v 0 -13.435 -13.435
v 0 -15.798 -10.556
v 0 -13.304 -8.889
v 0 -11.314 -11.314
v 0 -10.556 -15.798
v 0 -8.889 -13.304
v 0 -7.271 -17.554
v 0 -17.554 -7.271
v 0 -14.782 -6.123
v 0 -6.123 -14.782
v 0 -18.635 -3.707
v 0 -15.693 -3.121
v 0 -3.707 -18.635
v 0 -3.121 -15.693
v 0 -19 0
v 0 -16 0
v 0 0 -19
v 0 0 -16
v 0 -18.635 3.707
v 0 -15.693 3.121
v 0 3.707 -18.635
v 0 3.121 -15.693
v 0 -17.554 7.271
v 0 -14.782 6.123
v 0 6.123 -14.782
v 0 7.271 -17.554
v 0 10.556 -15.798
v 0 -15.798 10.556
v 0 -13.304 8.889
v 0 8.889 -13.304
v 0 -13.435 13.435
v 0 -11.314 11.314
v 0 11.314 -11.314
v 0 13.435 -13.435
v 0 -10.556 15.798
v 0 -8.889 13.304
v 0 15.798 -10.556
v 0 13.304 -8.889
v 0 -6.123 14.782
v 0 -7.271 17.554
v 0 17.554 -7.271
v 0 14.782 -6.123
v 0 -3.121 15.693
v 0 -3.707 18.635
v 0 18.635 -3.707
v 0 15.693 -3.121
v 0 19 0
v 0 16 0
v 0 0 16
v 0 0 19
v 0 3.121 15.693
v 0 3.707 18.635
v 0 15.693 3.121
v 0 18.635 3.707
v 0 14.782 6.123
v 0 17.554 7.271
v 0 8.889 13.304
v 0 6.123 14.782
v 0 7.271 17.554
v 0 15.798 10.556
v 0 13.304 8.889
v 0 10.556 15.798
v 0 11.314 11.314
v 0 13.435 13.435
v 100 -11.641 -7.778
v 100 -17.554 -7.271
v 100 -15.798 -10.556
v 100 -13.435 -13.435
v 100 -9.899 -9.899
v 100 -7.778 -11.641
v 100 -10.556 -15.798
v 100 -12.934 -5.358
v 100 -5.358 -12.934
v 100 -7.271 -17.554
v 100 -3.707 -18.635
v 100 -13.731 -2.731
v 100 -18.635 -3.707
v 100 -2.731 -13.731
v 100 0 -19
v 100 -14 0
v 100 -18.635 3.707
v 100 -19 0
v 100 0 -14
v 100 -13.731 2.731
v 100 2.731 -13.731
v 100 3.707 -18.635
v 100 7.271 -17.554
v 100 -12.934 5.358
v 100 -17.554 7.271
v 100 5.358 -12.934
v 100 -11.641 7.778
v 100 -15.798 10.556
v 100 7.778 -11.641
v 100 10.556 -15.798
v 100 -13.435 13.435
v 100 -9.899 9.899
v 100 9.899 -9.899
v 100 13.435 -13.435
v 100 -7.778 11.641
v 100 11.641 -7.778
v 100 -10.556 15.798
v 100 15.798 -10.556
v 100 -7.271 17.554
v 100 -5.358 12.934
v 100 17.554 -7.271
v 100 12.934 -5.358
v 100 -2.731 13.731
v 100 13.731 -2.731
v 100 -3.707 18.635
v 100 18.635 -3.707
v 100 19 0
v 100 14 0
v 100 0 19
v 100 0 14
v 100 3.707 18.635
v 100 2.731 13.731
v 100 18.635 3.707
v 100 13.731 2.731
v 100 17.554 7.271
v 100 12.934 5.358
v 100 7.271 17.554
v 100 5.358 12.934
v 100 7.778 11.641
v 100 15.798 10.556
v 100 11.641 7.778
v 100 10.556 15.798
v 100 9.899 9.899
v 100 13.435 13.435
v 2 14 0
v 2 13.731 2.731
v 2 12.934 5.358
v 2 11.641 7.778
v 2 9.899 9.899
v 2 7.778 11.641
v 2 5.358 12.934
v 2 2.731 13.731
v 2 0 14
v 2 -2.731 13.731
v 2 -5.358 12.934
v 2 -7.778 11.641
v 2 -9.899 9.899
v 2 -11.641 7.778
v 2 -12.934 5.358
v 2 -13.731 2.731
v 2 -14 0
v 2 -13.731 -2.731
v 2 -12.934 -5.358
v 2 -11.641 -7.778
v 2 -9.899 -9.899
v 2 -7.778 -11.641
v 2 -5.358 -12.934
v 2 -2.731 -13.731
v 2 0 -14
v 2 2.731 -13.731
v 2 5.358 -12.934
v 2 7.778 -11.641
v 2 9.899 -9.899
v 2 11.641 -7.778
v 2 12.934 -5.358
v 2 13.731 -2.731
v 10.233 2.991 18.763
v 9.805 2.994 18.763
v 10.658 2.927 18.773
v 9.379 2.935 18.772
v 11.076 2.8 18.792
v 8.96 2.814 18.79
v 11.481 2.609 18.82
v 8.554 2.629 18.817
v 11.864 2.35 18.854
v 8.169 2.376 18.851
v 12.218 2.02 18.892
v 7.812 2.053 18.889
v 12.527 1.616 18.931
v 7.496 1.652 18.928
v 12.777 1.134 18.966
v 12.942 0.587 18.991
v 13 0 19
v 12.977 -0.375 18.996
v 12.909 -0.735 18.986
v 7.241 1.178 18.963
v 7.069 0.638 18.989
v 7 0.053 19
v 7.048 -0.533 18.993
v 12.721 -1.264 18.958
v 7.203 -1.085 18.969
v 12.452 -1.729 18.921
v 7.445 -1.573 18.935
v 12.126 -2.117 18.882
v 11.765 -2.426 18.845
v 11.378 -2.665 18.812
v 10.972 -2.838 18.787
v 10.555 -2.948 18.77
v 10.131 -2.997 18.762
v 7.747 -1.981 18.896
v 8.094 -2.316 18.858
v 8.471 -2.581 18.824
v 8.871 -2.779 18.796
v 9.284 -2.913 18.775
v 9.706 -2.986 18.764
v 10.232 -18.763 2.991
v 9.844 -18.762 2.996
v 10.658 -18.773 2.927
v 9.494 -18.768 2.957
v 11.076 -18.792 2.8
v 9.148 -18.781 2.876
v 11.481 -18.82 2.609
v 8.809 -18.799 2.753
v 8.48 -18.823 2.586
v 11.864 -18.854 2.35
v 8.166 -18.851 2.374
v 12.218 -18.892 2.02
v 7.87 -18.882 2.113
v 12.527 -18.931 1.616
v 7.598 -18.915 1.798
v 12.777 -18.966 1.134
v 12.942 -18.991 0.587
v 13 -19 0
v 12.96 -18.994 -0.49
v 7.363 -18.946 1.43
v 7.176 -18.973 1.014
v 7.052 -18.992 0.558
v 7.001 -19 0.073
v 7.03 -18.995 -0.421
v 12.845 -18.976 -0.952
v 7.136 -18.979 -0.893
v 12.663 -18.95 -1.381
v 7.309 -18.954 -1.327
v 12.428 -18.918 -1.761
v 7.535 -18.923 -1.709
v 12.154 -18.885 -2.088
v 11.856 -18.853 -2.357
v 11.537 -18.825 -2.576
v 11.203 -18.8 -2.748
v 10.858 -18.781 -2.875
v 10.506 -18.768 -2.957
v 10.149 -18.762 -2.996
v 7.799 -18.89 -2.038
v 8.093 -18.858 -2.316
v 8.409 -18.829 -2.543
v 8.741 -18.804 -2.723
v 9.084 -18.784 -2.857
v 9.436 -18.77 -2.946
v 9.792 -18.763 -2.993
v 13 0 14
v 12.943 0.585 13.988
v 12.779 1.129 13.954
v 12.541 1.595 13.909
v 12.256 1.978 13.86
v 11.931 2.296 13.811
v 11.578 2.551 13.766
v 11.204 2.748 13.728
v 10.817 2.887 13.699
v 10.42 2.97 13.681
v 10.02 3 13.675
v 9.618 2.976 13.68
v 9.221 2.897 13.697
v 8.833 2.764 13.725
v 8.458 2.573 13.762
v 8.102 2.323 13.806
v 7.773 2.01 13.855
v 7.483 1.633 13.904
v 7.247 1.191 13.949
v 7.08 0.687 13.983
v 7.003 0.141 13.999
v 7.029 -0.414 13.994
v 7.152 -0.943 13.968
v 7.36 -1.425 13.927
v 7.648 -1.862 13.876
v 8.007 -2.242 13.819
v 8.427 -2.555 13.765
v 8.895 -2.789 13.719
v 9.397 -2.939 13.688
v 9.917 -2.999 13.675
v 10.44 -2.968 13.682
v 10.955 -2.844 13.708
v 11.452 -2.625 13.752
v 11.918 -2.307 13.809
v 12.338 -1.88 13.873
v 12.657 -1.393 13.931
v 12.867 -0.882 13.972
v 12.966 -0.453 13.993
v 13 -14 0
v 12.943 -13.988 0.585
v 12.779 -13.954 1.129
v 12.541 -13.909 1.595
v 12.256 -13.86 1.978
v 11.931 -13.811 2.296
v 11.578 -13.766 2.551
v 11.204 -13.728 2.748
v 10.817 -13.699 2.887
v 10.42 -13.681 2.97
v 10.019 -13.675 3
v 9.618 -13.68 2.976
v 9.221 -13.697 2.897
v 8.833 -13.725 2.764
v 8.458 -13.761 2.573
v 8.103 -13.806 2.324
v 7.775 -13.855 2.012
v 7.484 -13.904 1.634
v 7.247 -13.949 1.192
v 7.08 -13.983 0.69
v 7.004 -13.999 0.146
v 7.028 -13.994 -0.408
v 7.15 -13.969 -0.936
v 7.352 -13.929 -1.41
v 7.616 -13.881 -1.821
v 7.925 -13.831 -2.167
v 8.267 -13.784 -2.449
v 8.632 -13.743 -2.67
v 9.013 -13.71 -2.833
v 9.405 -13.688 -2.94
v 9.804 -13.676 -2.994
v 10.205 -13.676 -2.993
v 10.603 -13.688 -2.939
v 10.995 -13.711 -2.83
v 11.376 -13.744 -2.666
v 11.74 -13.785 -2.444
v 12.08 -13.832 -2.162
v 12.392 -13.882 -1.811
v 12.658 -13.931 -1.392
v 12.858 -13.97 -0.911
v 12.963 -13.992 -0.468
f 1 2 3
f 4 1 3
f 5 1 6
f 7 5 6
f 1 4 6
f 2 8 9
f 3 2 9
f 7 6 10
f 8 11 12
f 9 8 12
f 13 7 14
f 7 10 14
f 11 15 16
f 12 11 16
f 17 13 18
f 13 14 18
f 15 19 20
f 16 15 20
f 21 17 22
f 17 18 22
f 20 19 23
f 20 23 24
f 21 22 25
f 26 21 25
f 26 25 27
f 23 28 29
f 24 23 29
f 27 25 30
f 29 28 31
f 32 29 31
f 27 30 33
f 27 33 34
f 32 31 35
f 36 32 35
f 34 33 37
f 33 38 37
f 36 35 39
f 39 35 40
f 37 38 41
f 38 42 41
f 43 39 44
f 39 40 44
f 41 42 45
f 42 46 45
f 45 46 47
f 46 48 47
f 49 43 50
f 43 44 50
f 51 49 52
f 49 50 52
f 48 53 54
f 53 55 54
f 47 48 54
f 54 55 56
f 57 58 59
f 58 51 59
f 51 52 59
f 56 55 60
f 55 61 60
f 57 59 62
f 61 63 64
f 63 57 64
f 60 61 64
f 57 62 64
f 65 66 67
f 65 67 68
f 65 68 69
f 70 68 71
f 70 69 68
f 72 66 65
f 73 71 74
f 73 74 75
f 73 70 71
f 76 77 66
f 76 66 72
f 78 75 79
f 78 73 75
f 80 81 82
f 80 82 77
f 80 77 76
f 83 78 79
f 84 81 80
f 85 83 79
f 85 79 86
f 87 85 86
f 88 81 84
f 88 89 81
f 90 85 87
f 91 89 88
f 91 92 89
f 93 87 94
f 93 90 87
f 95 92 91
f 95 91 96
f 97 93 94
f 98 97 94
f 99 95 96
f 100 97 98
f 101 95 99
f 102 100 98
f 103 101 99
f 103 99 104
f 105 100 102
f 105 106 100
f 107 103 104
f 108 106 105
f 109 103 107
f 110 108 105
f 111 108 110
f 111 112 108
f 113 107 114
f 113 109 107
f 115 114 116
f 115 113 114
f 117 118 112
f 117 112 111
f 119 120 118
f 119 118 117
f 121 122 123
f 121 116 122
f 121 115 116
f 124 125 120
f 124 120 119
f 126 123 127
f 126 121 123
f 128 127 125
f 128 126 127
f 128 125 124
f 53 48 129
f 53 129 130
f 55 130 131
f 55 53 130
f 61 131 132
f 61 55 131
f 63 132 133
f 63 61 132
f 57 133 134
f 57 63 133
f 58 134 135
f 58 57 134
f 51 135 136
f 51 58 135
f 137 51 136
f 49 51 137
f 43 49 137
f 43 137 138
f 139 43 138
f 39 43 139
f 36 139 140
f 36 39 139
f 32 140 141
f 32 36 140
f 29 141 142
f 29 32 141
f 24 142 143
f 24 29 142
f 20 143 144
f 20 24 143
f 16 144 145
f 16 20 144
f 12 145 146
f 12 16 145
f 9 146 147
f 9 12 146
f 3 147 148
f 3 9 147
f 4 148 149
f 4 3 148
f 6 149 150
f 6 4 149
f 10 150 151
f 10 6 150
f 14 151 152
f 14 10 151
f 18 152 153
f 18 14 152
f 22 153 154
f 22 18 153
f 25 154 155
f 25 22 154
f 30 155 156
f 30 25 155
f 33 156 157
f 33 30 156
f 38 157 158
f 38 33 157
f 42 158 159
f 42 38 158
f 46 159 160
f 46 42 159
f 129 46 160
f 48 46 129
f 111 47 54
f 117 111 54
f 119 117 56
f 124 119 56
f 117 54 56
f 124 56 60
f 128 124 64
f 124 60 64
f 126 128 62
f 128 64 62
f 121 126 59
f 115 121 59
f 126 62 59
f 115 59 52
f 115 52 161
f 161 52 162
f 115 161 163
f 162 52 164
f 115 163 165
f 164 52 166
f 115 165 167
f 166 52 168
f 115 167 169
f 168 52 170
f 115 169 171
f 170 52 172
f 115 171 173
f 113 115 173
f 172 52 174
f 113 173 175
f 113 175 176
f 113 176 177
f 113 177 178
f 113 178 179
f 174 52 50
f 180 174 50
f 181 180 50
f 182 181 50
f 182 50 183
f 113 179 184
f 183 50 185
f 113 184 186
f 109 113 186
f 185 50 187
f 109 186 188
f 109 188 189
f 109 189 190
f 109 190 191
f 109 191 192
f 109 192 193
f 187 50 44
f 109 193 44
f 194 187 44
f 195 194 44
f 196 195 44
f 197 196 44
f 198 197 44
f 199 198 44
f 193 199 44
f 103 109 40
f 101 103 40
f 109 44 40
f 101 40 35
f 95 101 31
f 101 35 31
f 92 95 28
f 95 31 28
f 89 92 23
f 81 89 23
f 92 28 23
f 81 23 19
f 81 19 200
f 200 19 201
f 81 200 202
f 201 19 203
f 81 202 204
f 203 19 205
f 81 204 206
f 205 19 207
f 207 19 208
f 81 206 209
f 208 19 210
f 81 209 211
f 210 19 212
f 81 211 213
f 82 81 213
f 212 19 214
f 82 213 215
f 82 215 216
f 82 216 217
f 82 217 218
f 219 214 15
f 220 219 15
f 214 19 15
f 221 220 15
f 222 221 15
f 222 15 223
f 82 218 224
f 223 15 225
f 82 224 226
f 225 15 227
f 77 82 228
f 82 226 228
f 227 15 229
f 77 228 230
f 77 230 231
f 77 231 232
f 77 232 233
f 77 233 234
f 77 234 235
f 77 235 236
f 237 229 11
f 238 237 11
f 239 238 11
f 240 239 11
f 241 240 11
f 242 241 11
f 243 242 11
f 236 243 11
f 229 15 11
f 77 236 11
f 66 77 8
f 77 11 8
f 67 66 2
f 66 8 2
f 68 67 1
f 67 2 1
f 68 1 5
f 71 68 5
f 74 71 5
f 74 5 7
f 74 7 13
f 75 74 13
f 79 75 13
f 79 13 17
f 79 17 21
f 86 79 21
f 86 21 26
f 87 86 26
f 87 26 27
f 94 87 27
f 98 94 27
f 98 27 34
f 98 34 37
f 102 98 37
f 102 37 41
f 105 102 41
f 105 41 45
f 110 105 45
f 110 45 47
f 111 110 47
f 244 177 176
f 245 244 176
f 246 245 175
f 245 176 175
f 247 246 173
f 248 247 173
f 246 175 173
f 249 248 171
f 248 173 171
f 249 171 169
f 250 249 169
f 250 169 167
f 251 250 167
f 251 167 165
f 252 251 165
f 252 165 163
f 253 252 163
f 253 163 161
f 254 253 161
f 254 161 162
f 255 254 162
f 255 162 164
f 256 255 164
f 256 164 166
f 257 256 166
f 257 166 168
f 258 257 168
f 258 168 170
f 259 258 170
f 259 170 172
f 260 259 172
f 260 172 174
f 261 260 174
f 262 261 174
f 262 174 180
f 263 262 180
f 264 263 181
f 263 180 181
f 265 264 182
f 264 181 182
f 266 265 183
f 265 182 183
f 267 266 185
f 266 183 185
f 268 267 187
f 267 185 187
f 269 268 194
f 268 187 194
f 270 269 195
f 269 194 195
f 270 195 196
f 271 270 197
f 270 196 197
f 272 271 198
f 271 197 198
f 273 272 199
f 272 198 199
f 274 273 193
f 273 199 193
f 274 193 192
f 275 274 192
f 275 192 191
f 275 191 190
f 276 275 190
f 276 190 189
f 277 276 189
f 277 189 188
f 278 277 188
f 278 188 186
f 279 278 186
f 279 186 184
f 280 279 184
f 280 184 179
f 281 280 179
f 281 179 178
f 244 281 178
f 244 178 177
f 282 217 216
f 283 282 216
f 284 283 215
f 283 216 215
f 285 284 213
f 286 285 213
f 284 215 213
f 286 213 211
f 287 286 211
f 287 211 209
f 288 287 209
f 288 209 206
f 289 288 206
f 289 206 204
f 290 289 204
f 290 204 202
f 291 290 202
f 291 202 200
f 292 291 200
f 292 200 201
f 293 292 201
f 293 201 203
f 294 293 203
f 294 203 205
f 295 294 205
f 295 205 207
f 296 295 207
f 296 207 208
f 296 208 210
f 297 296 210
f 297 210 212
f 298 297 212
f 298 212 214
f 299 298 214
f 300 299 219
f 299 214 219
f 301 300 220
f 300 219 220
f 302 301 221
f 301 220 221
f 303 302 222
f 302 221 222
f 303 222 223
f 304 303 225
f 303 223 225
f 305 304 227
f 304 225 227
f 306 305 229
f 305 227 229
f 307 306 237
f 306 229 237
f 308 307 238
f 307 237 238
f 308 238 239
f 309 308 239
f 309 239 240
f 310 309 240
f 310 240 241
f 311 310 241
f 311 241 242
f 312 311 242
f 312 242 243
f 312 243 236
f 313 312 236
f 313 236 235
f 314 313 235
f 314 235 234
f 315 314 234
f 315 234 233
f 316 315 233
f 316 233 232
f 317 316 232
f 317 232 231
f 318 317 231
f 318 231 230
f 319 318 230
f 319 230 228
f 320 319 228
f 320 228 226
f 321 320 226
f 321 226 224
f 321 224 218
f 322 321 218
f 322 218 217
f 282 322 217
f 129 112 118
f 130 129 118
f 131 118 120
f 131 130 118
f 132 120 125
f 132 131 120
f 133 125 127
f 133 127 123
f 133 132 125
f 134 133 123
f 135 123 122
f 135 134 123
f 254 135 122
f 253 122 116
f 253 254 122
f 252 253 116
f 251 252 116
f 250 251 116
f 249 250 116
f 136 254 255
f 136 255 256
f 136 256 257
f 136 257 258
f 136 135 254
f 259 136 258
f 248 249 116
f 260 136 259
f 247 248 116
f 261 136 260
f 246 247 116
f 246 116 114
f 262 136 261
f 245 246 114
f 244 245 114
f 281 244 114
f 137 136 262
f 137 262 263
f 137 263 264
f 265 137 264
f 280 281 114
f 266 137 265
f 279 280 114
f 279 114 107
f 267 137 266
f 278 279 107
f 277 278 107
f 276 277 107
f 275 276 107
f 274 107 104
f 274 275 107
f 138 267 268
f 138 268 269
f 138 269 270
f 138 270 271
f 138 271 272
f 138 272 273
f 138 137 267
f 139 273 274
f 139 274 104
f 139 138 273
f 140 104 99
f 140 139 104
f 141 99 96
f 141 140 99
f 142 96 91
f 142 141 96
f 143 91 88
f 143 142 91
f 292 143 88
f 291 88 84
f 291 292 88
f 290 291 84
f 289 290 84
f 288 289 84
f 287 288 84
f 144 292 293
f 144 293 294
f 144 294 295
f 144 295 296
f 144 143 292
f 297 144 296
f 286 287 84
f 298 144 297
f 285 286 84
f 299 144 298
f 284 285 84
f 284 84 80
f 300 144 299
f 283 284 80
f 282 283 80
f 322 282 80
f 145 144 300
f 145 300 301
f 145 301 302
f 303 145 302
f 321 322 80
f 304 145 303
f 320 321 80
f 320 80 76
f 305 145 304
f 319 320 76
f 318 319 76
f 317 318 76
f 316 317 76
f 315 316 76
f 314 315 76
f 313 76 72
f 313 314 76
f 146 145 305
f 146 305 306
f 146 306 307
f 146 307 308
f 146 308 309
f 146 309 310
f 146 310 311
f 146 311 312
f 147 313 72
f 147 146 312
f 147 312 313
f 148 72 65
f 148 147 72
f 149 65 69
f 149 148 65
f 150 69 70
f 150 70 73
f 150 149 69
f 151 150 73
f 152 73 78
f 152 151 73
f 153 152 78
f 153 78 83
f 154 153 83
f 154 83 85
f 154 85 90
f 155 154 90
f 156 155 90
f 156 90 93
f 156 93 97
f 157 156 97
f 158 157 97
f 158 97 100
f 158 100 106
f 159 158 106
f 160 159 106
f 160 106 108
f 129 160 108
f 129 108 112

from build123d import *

# Parameters (mm, degrees)
F0_R     = 19
F0_R_2   = 14
F1_DEPTH = 100
F2_SIZE2 = 2
F2_SIZE  = 2
F5_R     = 3
F6_DEPTH = 5.3262057688
F7_R     = 3
F8_DEPTH = 5.3262057688


with BuildPart() as f1:
    # F0 (on Right) → F1 (new body)
    with BuildSketch(Plane.YZ):
        Circle(F0_R)
        Circle(F0_R_2, mode=Mode.SUBTRACT)
    extrude(amount=F1_DEPTH)

    # F2
    f2_edges = [f1.edges().sort_by_distance(p)[0] for p in [
        (0, -14, 0),
    ]]
    chamfer(f2_edges, length=F2_SIZE, length2=F2_SIZE2)

    # F5 (on offset) → F6 (cut, through all)
    with BuildSketch(Plane.XY.offset(19)):
        with Locations((10, 0)):
            Circle(F5_R)
    extrude(amount=-F6_DEPTH, mode=Mode.SUBTRACT)

    # F7 (on offset) → F8 (cut, through all)
    with BuildSketch(Plane.XZ.offset(19)):
        with Locations((10, 0)):
            Circle(F7_R)
    extrude(amount=-F8_DEPTH, mode=Mode.SUBTRACT)


solid = f1.part
